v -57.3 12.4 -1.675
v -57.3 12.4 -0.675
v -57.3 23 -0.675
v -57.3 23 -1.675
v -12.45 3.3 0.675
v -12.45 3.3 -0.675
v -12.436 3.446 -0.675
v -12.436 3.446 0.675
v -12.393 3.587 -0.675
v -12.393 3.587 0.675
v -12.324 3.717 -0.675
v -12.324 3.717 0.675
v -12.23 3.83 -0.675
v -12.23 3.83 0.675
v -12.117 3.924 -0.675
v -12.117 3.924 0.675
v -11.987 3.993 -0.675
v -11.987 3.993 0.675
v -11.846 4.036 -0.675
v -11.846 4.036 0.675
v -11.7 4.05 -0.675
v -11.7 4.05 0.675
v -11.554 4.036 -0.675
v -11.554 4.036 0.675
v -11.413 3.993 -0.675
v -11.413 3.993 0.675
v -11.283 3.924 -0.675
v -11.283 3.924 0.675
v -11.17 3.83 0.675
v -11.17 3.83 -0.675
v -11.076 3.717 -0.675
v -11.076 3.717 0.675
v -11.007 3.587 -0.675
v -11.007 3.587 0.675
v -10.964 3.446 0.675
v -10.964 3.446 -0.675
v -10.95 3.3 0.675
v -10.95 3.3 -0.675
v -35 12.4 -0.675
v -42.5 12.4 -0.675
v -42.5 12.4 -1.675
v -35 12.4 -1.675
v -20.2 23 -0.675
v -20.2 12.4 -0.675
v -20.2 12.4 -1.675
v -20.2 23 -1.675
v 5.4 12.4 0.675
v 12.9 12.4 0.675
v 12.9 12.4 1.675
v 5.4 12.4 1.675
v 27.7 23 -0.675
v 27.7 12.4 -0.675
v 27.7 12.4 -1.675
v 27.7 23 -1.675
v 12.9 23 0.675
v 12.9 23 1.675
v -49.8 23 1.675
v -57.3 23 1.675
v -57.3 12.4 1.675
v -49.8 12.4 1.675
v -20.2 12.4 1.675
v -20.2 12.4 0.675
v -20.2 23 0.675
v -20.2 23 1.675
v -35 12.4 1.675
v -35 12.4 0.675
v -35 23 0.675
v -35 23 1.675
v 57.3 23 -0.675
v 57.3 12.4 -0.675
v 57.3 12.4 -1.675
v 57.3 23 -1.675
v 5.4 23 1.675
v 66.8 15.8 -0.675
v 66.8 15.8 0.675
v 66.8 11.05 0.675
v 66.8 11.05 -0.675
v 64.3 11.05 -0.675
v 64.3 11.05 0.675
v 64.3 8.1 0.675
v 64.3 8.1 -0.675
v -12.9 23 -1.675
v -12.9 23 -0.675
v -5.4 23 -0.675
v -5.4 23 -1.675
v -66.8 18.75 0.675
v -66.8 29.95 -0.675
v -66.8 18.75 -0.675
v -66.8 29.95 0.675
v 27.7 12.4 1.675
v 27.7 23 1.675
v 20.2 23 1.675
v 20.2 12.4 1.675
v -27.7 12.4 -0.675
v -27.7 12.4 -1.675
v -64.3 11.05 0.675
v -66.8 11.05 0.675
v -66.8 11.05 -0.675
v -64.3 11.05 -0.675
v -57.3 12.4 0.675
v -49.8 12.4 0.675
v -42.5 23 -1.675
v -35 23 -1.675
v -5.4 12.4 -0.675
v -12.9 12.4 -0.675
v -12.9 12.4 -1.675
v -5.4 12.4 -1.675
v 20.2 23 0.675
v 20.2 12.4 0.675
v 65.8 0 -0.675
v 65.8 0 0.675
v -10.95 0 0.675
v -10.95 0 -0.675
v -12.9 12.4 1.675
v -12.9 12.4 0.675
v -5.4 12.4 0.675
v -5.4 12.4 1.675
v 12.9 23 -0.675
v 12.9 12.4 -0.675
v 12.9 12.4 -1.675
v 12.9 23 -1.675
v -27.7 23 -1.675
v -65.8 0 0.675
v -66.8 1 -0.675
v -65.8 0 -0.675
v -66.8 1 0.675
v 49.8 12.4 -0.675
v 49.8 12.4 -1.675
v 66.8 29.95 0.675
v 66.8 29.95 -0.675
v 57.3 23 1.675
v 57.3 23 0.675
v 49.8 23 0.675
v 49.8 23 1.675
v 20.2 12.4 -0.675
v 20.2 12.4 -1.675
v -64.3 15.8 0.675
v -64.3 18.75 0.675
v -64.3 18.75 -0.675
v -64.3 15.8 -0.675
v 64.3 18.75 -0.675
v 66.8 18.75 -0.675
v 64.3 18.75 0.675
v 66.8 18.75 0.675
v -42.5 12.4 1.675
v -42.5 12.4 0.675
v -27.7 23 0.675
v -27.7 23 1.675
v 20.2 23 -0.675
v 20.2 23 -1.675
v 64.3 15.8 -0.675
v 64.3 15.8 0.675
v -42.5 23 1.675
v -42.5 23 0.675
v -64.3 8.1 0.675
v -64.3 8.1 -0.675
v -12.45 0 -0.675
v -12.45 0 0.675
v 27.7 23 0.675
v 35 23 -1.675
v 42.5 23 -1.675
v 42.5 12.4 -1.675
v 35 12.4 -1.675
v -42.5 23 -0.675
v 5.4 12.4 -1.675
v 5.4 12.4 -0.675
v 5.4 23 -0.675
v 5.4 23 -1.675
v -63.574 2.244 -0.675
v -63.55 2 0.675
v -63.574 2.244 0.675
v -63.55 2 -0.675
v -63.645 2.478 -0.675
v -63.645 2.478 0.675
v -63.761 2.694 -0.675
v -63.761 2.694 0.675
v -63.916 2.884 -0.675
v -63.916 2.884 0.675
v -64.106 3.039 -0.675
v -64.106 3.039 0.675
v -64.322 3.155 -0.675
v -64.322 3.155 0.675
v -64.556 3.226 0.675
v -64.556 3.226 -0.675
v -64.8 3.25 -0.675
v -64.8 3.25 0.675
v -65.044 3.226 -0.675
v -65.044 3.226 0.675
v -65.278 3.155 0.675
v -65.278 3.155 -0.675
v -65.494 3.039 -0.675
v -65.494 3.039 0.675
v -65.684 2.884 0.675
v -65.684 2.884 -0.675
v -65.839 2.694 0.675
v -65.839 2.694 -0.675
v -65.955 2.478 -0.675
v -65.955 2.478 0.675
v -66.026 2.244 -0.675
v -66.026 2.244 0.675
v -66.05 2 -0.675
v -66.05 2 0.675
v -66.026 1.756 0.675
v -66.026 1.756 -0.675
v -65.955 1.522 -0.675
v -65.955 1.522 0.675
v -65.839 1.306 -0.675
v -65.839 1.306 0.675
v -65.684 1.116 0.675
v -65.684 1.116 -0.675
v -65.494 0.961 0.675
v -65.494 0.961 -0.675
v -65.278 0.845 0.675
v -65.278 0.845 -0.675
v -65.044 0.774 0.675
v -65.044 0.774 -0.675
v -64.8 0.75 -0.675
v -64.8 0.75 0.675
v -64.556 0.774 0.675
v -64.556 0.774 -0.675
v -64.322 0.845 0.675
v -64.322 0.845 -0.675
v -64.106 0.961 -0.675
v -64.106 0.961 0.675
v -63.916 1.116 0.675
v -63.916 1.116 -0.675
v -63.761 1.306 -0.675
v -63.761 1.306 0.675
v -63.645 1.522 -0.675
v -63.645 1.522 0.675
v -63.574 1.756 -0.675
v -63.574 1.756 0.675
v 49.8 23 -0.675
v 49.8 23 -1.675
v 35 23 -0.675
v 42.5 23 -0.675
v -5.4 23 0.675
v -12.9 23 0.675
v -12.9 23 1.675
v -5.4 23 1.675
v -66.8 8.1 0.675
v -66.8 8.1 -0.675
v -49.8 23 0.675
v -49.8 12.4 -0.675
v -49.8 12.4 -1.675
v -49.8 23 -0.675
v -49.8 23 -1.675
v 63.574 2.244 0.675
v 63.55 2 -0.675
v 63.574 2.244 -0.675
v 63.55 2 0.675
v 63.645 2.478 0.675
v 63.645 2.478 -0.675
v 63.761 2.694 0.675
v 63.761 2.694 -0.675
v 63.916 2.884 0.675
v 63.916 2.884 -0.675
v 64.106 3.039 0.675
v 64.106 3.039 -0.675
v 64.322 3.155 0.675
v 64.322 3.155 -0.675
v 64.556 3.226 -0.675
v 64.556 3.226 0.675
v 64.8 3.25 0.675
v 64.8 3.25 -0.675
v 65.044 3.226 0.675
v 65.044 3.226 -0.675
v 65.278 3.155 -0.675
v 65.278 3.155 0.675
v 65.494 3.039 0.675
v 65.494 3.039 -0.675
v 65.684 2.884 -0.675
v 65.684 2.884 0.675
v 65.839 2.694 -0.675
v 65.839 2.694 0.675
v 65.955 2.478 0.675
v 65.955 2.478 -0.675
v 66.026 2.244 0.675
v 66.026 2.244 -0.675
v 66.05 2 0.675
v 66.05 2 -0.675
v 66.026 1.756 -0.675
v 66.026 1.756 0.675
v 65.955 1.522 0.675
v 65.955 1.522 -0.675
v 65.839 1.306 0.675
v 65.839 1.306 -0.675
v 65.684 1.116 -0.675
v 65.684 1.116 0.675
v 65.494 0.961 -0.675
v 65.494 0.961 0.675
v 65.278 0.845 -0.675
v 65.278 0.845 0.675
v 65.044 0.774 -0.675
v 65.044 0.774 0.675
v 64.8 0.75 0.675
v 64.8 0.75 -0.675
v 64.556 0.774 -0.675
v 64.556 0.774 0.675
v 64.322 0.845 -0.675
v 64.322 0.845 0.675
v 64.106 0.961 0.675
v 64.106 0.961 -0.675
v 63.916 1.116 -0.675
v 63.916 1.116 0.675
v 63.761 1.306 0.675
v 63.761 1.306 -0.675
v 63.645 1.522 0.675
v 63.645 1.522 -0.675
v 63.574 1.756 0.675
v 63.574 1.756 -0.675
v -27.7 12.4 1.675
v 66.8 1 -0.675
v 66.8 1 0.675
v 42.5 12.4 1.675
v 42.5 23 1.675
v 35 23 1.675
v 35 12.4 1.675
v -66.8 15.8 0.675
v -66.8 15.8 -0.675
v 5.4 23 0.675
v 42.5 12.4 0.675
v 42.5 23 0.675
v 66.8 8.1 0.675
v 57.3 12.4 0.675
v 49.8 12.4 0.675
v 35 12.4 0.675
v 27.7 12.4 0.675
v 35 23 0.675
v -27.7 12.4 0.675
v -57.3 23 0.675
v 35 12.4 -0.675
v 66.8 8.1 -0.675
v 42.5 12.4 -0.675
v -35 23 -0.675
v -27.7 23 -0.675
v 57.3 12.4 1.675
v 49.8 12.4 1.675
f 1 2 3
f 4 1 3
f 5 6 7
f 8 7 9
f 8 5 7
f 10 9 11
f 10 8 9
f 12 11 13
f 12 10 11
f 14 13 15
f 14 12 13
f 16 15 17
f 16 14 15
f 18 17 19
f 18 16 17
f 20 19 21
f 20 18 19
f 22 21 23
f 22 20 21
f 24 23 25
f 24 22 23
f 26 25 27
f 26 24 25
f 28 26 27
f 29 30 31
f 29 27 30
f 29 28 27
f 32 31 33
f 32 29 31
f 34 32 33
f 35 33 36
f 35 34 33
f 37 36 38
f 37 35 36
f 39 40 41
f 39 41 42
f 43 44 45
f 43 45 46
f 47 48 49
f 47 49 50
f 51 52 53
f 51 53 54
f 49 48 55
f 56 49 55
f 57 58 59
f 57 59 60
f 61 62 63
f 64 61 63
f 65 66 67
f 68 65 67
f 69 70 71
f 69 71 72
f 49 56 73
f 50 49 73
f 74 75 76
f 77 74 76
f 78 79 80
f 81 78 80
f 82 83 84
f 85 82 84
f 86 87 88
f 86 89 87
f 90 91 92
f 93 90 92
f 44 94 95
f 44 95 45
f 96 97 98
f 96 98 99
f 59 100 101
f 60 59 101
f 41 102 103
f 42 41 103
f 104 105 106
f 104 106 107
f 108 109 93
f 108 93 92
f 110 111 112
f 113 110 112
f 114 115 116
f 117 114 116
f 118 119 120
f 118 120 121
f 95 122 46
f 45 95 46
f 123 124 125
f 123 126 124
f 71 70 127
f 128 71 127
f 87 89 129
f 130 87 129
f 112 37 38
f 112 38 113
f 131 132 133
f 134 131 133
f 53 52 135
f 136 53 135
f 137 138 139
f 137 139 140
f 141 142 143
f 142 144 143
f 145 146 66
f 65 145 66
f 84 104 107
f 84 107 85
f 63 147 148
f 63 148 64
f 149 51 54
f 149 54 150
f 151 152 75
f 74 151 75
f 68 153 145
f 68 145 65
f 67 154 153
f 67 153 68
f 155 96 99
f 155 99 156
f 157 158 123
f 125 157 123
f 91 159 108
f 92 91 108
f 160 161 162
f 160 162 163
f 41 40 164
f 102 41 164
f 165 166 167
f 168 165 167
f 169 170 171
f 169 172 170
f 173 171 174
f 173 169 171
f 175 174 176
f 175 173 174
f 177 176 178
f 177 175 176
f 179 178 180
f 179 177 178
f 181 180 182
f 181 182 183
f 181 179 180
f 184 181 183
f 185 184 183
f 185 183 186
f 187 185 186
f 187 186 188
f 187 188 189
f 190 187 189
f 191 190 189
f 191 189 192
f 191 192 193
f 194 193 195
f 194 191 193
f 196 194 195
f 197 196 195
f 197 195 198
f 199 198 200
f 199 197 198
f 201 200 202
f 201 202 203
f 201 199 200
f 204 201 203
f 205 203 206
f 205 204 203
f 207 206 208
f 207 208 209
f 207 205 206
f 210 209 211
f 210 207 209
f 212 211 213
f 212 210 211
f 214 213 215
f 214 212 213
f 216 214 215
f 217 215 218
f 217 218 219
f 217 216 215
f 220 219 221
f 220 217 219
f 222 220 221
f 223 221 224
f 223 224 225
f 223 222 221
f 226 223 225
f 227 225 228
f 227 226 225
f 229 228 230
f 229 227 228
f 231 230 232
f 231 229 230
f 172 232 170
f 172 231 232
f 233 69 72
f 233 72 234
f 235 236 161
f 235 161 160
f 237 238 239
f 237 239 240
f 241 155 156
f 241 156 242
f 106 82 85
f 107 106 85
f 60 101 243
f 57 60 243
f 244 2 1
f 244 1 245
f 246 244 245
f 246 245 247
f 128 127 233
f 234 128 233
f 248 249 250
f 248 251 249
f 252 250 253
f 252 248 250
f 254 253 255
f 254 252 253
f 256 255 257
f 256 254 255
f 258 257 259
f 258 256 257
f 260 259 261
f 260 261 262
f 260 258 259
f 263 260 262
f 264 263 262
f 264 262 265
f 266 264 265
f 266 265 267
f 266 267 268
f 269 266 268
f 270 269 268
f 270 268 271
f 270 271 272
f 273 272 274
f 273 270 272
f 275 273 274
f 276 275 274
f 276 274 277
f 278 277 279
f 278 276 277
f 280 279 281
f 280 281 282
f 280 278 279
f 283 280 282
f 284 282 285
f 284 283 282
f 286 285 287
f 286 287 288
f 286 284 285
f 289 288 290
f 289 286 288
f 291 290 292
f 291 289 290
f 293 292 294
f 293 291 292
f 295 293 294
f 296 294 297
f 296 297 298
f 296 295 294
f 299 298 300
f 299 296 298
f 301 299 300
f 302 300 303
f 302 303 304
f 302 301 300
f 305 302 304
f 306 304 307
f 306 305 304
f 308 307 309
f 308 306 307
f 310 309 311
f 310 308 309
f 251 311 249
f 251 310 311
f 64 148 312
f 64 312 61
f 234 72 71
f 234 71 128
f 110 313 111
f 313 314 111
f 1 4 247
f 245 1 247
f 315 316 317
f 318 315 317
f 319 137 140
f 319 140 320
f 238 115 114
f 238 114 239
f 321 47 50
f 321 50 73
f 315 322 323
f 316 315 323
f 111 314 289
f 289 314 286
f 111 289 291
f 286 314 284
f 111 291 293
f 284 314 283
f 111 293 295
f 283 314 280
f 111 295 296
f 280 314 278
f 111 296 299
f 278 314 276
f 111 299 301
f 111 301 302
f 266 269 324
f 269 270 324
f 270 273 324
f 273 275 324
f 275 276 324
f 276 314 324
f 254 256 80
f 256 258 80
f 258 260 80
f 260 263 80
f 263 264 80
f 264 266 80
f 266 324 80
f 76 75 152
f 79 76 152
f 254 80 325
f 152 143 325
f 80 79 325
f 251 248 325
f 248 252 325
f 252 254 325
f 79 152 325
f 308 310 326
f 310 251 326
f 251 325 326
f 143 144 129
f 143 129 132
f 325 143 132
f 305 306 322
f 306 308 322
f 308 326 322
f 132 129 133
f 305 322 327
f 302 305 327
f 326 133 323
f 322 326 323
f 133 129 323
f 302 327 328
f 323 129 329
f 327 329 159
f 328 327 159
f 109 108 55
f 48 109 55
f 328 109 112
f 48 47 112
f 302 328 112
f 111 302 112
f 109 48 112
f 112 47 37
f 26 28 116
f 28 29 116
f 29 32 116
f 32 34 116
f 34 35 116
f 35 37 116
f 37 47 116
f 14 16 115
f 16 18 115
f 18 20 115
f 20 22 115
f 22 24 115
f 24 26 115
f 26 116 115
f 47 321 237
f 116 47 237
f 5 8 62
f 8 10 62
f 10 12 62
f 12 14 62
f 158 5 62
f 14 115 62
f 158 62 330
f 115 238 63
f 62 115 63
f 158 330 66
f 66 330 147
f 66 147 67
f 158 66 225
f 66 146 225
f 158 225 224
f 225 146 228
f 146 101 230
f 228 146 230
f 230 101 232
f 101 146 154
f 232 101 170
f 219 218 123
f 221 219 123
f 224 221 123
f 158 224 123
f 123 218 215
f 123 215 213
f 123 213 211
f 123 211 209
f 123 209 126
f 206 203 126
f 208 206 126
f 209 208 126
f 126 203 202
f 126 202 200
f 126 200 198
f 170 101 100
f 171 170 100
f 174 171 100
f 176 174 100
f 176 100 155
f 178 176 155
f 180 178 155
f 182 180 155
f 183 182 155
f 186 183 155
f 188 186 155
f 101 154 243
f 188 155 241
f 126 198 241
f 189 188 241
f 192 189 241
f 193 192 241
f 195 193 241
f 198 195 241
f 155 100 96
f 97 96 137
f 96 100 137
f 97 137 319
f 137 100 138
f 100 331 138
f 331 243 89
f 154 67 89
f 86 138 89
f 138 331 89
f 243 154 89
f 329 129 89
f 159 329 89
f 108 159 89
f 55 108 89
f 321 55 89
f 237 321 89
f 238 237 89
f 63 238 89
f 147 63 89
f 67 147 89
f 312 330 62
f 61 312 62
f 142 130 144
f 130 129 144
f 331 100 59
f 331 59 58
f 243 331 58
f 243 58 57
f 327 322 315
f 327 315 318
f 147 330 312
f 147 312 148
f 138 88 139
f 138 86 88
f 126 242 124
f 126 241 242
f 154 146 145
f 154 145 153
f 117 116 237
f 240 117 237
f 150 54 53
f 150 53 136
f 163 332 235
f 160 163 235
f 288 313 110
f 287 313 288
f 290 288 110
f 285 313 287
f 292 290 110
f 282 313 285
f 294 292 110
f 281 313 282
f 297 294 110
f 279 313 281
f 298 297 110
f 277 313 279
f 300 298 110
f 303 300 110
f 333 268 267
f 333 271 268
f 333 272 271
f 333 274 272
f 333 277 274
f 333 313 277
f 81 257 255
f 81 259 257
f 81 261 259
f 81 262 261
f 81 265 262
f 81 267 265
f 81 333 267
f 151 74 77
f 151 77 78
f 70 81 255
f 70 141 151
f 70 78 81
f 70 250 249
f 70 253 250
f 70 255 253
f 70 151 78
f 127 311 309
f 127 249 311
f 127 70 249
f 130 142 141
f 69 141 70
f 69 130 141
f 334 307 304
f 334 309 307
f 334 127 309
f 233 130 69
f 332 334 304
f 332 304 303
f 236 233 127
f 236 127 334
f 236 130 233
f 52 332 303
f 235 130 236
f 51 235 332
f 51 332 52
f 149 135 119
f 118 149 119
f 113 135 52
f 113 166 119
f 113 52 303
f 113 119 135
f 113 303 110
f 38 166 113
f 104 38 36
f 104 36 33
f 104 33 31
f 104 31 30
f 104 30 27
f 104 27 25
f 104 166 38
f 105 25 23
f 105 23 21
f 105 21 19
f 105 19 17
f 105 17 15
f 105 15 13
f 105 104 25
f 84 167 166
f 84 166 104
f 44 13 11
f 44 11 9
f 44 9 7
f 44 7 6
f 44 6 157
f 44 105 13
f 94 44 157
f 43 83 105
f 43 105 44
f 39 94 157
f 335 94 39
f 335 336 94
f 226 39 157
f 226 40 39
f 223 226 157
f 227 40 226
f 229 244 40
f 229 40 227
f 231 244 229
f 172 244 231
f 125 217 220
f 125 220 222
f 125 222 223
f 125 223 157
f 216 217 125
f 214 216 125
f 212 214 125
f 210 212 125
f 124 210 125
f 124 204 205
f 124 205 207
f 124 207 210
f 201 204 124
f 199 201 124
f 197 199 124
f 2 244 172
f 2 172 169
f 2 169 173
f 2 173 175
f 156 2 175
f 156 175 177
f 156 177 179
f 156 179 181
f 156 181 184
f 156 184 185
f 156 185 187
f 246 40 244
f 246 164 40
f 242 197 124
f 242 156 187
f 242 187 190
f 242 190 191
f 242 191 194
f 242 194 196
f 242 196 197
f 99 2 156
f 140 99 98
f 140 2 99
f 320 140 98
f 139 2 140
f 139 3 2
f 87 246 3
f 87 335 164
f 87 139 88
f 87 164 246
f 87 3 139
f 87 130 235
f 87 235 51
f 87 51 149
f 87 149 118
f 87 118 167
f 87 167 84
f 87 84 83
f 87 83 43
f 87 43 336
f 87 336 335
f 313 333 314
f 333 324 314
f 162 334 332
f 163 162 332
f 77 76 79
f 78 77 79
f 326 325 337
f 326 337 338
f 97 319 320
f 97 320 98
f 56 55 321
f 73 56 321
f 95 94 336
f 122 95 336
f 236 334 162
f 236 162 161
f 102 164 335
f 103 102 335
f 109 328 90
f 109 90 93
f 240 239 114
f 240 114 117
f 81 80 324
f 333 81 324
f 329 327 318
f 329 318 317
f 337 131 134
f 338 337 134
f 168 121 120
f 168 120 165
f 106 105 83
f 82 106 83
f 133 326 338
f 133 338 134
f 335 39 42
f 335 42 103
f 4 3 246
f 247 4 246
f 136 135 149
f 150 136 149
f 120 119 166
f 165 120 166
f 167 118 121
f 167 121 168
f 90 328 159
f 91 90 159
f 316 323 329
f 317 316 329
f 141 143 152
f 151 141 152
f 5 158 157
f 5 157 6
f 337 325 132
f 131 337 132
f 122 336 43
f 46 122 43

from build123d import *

# Parameters (mm, degrees)
SKETCH1_R           = 1.25
BOSS_EXTRUDE1_DEPTH = 0.675
SKETCH2_W           = 7.5
SKETCH2_H           = 10.6
BOSS_EXTRUDE2_DEPTH = 1
CUT_EXTRUDE1_DEPTH  = 3.35


with BuildPart() as part:
    # Sketch1 → Boss-Extrude1 (new body)
    with BuildSketch(Plane.XY):
        Polygon((-66.8, 18.75), (-64.3, 18.75), (-64.3, 15.8), (-66.8, 15.8), (-66.8, 11.05), (-64.3, 11.05), (-64.3, 8.1), (-66.8, 8.1), (-66.8, 1), (-65.8, 0), (0, 0), (0, 29.95), (-66.8, 29.95), align=None)
        with Locations((-64.8, 2)):
            Circle(SKETCH1_R, mode=Mode.SUBTRACT)
    extrude(amount=BOSS_EXTRUDE1_DEPTH)

    # Sketch2 → Boss-Extrude2 (add)
    with BuildSketch(Plane.XY.offset(0.675)):
        with Locations((-53.55, 17.7)):
            Rectangle(SKETCH2_W, SKETCH2_H)
        with Locations((-38.75, 17.7)):
            Rectangle(SKETCH2_W, SKETCH2_H)
        with Locations((-23.95, 17.7)):
            Rectangle(SKETCH2_W, SKETCH2_H)
        with Locations((-9.15, 17.7)):
            Rectangle(SKETCH2_W, SKETCH2_H)
    extrude(amount=BOSS_EXTRUDE2_DEPTH)

    # Mirror1: part across plane


with BuildPart() as part_1:
    add(part.part)
    add(part.part.mirror(Plane.XY))

    # Mirror2: part across plane


with BuildPart() as part_2:
    add(part_1.part)
    add(part_1.part.mirror(Plane(origin=(0, 0, 0), x_dir=(0, 0, 1), z_dir=(1, 0, 0))))

    # Sketch3 → Cut-Extrude1 (cut, through all)
    with BuildSketch(Plane.XY.offset(0.675)):
        with BuildLine():
            Line((-12.45, 0), (-12.45, 3.3))
            ThreePointArc((-12.45, 3.3), (-11.7, 4.05), (-10.95, 3.3))
            Line((-10.95, 3.3), (-10.95, 0))
            Line((-10.95, 0), (-12.45, 0))
        make_face()
    extrude(amount=-CUT_EXTRUDE1_DEPTH, mode=Mode.SUBTRACT)


solid = part_2.part
